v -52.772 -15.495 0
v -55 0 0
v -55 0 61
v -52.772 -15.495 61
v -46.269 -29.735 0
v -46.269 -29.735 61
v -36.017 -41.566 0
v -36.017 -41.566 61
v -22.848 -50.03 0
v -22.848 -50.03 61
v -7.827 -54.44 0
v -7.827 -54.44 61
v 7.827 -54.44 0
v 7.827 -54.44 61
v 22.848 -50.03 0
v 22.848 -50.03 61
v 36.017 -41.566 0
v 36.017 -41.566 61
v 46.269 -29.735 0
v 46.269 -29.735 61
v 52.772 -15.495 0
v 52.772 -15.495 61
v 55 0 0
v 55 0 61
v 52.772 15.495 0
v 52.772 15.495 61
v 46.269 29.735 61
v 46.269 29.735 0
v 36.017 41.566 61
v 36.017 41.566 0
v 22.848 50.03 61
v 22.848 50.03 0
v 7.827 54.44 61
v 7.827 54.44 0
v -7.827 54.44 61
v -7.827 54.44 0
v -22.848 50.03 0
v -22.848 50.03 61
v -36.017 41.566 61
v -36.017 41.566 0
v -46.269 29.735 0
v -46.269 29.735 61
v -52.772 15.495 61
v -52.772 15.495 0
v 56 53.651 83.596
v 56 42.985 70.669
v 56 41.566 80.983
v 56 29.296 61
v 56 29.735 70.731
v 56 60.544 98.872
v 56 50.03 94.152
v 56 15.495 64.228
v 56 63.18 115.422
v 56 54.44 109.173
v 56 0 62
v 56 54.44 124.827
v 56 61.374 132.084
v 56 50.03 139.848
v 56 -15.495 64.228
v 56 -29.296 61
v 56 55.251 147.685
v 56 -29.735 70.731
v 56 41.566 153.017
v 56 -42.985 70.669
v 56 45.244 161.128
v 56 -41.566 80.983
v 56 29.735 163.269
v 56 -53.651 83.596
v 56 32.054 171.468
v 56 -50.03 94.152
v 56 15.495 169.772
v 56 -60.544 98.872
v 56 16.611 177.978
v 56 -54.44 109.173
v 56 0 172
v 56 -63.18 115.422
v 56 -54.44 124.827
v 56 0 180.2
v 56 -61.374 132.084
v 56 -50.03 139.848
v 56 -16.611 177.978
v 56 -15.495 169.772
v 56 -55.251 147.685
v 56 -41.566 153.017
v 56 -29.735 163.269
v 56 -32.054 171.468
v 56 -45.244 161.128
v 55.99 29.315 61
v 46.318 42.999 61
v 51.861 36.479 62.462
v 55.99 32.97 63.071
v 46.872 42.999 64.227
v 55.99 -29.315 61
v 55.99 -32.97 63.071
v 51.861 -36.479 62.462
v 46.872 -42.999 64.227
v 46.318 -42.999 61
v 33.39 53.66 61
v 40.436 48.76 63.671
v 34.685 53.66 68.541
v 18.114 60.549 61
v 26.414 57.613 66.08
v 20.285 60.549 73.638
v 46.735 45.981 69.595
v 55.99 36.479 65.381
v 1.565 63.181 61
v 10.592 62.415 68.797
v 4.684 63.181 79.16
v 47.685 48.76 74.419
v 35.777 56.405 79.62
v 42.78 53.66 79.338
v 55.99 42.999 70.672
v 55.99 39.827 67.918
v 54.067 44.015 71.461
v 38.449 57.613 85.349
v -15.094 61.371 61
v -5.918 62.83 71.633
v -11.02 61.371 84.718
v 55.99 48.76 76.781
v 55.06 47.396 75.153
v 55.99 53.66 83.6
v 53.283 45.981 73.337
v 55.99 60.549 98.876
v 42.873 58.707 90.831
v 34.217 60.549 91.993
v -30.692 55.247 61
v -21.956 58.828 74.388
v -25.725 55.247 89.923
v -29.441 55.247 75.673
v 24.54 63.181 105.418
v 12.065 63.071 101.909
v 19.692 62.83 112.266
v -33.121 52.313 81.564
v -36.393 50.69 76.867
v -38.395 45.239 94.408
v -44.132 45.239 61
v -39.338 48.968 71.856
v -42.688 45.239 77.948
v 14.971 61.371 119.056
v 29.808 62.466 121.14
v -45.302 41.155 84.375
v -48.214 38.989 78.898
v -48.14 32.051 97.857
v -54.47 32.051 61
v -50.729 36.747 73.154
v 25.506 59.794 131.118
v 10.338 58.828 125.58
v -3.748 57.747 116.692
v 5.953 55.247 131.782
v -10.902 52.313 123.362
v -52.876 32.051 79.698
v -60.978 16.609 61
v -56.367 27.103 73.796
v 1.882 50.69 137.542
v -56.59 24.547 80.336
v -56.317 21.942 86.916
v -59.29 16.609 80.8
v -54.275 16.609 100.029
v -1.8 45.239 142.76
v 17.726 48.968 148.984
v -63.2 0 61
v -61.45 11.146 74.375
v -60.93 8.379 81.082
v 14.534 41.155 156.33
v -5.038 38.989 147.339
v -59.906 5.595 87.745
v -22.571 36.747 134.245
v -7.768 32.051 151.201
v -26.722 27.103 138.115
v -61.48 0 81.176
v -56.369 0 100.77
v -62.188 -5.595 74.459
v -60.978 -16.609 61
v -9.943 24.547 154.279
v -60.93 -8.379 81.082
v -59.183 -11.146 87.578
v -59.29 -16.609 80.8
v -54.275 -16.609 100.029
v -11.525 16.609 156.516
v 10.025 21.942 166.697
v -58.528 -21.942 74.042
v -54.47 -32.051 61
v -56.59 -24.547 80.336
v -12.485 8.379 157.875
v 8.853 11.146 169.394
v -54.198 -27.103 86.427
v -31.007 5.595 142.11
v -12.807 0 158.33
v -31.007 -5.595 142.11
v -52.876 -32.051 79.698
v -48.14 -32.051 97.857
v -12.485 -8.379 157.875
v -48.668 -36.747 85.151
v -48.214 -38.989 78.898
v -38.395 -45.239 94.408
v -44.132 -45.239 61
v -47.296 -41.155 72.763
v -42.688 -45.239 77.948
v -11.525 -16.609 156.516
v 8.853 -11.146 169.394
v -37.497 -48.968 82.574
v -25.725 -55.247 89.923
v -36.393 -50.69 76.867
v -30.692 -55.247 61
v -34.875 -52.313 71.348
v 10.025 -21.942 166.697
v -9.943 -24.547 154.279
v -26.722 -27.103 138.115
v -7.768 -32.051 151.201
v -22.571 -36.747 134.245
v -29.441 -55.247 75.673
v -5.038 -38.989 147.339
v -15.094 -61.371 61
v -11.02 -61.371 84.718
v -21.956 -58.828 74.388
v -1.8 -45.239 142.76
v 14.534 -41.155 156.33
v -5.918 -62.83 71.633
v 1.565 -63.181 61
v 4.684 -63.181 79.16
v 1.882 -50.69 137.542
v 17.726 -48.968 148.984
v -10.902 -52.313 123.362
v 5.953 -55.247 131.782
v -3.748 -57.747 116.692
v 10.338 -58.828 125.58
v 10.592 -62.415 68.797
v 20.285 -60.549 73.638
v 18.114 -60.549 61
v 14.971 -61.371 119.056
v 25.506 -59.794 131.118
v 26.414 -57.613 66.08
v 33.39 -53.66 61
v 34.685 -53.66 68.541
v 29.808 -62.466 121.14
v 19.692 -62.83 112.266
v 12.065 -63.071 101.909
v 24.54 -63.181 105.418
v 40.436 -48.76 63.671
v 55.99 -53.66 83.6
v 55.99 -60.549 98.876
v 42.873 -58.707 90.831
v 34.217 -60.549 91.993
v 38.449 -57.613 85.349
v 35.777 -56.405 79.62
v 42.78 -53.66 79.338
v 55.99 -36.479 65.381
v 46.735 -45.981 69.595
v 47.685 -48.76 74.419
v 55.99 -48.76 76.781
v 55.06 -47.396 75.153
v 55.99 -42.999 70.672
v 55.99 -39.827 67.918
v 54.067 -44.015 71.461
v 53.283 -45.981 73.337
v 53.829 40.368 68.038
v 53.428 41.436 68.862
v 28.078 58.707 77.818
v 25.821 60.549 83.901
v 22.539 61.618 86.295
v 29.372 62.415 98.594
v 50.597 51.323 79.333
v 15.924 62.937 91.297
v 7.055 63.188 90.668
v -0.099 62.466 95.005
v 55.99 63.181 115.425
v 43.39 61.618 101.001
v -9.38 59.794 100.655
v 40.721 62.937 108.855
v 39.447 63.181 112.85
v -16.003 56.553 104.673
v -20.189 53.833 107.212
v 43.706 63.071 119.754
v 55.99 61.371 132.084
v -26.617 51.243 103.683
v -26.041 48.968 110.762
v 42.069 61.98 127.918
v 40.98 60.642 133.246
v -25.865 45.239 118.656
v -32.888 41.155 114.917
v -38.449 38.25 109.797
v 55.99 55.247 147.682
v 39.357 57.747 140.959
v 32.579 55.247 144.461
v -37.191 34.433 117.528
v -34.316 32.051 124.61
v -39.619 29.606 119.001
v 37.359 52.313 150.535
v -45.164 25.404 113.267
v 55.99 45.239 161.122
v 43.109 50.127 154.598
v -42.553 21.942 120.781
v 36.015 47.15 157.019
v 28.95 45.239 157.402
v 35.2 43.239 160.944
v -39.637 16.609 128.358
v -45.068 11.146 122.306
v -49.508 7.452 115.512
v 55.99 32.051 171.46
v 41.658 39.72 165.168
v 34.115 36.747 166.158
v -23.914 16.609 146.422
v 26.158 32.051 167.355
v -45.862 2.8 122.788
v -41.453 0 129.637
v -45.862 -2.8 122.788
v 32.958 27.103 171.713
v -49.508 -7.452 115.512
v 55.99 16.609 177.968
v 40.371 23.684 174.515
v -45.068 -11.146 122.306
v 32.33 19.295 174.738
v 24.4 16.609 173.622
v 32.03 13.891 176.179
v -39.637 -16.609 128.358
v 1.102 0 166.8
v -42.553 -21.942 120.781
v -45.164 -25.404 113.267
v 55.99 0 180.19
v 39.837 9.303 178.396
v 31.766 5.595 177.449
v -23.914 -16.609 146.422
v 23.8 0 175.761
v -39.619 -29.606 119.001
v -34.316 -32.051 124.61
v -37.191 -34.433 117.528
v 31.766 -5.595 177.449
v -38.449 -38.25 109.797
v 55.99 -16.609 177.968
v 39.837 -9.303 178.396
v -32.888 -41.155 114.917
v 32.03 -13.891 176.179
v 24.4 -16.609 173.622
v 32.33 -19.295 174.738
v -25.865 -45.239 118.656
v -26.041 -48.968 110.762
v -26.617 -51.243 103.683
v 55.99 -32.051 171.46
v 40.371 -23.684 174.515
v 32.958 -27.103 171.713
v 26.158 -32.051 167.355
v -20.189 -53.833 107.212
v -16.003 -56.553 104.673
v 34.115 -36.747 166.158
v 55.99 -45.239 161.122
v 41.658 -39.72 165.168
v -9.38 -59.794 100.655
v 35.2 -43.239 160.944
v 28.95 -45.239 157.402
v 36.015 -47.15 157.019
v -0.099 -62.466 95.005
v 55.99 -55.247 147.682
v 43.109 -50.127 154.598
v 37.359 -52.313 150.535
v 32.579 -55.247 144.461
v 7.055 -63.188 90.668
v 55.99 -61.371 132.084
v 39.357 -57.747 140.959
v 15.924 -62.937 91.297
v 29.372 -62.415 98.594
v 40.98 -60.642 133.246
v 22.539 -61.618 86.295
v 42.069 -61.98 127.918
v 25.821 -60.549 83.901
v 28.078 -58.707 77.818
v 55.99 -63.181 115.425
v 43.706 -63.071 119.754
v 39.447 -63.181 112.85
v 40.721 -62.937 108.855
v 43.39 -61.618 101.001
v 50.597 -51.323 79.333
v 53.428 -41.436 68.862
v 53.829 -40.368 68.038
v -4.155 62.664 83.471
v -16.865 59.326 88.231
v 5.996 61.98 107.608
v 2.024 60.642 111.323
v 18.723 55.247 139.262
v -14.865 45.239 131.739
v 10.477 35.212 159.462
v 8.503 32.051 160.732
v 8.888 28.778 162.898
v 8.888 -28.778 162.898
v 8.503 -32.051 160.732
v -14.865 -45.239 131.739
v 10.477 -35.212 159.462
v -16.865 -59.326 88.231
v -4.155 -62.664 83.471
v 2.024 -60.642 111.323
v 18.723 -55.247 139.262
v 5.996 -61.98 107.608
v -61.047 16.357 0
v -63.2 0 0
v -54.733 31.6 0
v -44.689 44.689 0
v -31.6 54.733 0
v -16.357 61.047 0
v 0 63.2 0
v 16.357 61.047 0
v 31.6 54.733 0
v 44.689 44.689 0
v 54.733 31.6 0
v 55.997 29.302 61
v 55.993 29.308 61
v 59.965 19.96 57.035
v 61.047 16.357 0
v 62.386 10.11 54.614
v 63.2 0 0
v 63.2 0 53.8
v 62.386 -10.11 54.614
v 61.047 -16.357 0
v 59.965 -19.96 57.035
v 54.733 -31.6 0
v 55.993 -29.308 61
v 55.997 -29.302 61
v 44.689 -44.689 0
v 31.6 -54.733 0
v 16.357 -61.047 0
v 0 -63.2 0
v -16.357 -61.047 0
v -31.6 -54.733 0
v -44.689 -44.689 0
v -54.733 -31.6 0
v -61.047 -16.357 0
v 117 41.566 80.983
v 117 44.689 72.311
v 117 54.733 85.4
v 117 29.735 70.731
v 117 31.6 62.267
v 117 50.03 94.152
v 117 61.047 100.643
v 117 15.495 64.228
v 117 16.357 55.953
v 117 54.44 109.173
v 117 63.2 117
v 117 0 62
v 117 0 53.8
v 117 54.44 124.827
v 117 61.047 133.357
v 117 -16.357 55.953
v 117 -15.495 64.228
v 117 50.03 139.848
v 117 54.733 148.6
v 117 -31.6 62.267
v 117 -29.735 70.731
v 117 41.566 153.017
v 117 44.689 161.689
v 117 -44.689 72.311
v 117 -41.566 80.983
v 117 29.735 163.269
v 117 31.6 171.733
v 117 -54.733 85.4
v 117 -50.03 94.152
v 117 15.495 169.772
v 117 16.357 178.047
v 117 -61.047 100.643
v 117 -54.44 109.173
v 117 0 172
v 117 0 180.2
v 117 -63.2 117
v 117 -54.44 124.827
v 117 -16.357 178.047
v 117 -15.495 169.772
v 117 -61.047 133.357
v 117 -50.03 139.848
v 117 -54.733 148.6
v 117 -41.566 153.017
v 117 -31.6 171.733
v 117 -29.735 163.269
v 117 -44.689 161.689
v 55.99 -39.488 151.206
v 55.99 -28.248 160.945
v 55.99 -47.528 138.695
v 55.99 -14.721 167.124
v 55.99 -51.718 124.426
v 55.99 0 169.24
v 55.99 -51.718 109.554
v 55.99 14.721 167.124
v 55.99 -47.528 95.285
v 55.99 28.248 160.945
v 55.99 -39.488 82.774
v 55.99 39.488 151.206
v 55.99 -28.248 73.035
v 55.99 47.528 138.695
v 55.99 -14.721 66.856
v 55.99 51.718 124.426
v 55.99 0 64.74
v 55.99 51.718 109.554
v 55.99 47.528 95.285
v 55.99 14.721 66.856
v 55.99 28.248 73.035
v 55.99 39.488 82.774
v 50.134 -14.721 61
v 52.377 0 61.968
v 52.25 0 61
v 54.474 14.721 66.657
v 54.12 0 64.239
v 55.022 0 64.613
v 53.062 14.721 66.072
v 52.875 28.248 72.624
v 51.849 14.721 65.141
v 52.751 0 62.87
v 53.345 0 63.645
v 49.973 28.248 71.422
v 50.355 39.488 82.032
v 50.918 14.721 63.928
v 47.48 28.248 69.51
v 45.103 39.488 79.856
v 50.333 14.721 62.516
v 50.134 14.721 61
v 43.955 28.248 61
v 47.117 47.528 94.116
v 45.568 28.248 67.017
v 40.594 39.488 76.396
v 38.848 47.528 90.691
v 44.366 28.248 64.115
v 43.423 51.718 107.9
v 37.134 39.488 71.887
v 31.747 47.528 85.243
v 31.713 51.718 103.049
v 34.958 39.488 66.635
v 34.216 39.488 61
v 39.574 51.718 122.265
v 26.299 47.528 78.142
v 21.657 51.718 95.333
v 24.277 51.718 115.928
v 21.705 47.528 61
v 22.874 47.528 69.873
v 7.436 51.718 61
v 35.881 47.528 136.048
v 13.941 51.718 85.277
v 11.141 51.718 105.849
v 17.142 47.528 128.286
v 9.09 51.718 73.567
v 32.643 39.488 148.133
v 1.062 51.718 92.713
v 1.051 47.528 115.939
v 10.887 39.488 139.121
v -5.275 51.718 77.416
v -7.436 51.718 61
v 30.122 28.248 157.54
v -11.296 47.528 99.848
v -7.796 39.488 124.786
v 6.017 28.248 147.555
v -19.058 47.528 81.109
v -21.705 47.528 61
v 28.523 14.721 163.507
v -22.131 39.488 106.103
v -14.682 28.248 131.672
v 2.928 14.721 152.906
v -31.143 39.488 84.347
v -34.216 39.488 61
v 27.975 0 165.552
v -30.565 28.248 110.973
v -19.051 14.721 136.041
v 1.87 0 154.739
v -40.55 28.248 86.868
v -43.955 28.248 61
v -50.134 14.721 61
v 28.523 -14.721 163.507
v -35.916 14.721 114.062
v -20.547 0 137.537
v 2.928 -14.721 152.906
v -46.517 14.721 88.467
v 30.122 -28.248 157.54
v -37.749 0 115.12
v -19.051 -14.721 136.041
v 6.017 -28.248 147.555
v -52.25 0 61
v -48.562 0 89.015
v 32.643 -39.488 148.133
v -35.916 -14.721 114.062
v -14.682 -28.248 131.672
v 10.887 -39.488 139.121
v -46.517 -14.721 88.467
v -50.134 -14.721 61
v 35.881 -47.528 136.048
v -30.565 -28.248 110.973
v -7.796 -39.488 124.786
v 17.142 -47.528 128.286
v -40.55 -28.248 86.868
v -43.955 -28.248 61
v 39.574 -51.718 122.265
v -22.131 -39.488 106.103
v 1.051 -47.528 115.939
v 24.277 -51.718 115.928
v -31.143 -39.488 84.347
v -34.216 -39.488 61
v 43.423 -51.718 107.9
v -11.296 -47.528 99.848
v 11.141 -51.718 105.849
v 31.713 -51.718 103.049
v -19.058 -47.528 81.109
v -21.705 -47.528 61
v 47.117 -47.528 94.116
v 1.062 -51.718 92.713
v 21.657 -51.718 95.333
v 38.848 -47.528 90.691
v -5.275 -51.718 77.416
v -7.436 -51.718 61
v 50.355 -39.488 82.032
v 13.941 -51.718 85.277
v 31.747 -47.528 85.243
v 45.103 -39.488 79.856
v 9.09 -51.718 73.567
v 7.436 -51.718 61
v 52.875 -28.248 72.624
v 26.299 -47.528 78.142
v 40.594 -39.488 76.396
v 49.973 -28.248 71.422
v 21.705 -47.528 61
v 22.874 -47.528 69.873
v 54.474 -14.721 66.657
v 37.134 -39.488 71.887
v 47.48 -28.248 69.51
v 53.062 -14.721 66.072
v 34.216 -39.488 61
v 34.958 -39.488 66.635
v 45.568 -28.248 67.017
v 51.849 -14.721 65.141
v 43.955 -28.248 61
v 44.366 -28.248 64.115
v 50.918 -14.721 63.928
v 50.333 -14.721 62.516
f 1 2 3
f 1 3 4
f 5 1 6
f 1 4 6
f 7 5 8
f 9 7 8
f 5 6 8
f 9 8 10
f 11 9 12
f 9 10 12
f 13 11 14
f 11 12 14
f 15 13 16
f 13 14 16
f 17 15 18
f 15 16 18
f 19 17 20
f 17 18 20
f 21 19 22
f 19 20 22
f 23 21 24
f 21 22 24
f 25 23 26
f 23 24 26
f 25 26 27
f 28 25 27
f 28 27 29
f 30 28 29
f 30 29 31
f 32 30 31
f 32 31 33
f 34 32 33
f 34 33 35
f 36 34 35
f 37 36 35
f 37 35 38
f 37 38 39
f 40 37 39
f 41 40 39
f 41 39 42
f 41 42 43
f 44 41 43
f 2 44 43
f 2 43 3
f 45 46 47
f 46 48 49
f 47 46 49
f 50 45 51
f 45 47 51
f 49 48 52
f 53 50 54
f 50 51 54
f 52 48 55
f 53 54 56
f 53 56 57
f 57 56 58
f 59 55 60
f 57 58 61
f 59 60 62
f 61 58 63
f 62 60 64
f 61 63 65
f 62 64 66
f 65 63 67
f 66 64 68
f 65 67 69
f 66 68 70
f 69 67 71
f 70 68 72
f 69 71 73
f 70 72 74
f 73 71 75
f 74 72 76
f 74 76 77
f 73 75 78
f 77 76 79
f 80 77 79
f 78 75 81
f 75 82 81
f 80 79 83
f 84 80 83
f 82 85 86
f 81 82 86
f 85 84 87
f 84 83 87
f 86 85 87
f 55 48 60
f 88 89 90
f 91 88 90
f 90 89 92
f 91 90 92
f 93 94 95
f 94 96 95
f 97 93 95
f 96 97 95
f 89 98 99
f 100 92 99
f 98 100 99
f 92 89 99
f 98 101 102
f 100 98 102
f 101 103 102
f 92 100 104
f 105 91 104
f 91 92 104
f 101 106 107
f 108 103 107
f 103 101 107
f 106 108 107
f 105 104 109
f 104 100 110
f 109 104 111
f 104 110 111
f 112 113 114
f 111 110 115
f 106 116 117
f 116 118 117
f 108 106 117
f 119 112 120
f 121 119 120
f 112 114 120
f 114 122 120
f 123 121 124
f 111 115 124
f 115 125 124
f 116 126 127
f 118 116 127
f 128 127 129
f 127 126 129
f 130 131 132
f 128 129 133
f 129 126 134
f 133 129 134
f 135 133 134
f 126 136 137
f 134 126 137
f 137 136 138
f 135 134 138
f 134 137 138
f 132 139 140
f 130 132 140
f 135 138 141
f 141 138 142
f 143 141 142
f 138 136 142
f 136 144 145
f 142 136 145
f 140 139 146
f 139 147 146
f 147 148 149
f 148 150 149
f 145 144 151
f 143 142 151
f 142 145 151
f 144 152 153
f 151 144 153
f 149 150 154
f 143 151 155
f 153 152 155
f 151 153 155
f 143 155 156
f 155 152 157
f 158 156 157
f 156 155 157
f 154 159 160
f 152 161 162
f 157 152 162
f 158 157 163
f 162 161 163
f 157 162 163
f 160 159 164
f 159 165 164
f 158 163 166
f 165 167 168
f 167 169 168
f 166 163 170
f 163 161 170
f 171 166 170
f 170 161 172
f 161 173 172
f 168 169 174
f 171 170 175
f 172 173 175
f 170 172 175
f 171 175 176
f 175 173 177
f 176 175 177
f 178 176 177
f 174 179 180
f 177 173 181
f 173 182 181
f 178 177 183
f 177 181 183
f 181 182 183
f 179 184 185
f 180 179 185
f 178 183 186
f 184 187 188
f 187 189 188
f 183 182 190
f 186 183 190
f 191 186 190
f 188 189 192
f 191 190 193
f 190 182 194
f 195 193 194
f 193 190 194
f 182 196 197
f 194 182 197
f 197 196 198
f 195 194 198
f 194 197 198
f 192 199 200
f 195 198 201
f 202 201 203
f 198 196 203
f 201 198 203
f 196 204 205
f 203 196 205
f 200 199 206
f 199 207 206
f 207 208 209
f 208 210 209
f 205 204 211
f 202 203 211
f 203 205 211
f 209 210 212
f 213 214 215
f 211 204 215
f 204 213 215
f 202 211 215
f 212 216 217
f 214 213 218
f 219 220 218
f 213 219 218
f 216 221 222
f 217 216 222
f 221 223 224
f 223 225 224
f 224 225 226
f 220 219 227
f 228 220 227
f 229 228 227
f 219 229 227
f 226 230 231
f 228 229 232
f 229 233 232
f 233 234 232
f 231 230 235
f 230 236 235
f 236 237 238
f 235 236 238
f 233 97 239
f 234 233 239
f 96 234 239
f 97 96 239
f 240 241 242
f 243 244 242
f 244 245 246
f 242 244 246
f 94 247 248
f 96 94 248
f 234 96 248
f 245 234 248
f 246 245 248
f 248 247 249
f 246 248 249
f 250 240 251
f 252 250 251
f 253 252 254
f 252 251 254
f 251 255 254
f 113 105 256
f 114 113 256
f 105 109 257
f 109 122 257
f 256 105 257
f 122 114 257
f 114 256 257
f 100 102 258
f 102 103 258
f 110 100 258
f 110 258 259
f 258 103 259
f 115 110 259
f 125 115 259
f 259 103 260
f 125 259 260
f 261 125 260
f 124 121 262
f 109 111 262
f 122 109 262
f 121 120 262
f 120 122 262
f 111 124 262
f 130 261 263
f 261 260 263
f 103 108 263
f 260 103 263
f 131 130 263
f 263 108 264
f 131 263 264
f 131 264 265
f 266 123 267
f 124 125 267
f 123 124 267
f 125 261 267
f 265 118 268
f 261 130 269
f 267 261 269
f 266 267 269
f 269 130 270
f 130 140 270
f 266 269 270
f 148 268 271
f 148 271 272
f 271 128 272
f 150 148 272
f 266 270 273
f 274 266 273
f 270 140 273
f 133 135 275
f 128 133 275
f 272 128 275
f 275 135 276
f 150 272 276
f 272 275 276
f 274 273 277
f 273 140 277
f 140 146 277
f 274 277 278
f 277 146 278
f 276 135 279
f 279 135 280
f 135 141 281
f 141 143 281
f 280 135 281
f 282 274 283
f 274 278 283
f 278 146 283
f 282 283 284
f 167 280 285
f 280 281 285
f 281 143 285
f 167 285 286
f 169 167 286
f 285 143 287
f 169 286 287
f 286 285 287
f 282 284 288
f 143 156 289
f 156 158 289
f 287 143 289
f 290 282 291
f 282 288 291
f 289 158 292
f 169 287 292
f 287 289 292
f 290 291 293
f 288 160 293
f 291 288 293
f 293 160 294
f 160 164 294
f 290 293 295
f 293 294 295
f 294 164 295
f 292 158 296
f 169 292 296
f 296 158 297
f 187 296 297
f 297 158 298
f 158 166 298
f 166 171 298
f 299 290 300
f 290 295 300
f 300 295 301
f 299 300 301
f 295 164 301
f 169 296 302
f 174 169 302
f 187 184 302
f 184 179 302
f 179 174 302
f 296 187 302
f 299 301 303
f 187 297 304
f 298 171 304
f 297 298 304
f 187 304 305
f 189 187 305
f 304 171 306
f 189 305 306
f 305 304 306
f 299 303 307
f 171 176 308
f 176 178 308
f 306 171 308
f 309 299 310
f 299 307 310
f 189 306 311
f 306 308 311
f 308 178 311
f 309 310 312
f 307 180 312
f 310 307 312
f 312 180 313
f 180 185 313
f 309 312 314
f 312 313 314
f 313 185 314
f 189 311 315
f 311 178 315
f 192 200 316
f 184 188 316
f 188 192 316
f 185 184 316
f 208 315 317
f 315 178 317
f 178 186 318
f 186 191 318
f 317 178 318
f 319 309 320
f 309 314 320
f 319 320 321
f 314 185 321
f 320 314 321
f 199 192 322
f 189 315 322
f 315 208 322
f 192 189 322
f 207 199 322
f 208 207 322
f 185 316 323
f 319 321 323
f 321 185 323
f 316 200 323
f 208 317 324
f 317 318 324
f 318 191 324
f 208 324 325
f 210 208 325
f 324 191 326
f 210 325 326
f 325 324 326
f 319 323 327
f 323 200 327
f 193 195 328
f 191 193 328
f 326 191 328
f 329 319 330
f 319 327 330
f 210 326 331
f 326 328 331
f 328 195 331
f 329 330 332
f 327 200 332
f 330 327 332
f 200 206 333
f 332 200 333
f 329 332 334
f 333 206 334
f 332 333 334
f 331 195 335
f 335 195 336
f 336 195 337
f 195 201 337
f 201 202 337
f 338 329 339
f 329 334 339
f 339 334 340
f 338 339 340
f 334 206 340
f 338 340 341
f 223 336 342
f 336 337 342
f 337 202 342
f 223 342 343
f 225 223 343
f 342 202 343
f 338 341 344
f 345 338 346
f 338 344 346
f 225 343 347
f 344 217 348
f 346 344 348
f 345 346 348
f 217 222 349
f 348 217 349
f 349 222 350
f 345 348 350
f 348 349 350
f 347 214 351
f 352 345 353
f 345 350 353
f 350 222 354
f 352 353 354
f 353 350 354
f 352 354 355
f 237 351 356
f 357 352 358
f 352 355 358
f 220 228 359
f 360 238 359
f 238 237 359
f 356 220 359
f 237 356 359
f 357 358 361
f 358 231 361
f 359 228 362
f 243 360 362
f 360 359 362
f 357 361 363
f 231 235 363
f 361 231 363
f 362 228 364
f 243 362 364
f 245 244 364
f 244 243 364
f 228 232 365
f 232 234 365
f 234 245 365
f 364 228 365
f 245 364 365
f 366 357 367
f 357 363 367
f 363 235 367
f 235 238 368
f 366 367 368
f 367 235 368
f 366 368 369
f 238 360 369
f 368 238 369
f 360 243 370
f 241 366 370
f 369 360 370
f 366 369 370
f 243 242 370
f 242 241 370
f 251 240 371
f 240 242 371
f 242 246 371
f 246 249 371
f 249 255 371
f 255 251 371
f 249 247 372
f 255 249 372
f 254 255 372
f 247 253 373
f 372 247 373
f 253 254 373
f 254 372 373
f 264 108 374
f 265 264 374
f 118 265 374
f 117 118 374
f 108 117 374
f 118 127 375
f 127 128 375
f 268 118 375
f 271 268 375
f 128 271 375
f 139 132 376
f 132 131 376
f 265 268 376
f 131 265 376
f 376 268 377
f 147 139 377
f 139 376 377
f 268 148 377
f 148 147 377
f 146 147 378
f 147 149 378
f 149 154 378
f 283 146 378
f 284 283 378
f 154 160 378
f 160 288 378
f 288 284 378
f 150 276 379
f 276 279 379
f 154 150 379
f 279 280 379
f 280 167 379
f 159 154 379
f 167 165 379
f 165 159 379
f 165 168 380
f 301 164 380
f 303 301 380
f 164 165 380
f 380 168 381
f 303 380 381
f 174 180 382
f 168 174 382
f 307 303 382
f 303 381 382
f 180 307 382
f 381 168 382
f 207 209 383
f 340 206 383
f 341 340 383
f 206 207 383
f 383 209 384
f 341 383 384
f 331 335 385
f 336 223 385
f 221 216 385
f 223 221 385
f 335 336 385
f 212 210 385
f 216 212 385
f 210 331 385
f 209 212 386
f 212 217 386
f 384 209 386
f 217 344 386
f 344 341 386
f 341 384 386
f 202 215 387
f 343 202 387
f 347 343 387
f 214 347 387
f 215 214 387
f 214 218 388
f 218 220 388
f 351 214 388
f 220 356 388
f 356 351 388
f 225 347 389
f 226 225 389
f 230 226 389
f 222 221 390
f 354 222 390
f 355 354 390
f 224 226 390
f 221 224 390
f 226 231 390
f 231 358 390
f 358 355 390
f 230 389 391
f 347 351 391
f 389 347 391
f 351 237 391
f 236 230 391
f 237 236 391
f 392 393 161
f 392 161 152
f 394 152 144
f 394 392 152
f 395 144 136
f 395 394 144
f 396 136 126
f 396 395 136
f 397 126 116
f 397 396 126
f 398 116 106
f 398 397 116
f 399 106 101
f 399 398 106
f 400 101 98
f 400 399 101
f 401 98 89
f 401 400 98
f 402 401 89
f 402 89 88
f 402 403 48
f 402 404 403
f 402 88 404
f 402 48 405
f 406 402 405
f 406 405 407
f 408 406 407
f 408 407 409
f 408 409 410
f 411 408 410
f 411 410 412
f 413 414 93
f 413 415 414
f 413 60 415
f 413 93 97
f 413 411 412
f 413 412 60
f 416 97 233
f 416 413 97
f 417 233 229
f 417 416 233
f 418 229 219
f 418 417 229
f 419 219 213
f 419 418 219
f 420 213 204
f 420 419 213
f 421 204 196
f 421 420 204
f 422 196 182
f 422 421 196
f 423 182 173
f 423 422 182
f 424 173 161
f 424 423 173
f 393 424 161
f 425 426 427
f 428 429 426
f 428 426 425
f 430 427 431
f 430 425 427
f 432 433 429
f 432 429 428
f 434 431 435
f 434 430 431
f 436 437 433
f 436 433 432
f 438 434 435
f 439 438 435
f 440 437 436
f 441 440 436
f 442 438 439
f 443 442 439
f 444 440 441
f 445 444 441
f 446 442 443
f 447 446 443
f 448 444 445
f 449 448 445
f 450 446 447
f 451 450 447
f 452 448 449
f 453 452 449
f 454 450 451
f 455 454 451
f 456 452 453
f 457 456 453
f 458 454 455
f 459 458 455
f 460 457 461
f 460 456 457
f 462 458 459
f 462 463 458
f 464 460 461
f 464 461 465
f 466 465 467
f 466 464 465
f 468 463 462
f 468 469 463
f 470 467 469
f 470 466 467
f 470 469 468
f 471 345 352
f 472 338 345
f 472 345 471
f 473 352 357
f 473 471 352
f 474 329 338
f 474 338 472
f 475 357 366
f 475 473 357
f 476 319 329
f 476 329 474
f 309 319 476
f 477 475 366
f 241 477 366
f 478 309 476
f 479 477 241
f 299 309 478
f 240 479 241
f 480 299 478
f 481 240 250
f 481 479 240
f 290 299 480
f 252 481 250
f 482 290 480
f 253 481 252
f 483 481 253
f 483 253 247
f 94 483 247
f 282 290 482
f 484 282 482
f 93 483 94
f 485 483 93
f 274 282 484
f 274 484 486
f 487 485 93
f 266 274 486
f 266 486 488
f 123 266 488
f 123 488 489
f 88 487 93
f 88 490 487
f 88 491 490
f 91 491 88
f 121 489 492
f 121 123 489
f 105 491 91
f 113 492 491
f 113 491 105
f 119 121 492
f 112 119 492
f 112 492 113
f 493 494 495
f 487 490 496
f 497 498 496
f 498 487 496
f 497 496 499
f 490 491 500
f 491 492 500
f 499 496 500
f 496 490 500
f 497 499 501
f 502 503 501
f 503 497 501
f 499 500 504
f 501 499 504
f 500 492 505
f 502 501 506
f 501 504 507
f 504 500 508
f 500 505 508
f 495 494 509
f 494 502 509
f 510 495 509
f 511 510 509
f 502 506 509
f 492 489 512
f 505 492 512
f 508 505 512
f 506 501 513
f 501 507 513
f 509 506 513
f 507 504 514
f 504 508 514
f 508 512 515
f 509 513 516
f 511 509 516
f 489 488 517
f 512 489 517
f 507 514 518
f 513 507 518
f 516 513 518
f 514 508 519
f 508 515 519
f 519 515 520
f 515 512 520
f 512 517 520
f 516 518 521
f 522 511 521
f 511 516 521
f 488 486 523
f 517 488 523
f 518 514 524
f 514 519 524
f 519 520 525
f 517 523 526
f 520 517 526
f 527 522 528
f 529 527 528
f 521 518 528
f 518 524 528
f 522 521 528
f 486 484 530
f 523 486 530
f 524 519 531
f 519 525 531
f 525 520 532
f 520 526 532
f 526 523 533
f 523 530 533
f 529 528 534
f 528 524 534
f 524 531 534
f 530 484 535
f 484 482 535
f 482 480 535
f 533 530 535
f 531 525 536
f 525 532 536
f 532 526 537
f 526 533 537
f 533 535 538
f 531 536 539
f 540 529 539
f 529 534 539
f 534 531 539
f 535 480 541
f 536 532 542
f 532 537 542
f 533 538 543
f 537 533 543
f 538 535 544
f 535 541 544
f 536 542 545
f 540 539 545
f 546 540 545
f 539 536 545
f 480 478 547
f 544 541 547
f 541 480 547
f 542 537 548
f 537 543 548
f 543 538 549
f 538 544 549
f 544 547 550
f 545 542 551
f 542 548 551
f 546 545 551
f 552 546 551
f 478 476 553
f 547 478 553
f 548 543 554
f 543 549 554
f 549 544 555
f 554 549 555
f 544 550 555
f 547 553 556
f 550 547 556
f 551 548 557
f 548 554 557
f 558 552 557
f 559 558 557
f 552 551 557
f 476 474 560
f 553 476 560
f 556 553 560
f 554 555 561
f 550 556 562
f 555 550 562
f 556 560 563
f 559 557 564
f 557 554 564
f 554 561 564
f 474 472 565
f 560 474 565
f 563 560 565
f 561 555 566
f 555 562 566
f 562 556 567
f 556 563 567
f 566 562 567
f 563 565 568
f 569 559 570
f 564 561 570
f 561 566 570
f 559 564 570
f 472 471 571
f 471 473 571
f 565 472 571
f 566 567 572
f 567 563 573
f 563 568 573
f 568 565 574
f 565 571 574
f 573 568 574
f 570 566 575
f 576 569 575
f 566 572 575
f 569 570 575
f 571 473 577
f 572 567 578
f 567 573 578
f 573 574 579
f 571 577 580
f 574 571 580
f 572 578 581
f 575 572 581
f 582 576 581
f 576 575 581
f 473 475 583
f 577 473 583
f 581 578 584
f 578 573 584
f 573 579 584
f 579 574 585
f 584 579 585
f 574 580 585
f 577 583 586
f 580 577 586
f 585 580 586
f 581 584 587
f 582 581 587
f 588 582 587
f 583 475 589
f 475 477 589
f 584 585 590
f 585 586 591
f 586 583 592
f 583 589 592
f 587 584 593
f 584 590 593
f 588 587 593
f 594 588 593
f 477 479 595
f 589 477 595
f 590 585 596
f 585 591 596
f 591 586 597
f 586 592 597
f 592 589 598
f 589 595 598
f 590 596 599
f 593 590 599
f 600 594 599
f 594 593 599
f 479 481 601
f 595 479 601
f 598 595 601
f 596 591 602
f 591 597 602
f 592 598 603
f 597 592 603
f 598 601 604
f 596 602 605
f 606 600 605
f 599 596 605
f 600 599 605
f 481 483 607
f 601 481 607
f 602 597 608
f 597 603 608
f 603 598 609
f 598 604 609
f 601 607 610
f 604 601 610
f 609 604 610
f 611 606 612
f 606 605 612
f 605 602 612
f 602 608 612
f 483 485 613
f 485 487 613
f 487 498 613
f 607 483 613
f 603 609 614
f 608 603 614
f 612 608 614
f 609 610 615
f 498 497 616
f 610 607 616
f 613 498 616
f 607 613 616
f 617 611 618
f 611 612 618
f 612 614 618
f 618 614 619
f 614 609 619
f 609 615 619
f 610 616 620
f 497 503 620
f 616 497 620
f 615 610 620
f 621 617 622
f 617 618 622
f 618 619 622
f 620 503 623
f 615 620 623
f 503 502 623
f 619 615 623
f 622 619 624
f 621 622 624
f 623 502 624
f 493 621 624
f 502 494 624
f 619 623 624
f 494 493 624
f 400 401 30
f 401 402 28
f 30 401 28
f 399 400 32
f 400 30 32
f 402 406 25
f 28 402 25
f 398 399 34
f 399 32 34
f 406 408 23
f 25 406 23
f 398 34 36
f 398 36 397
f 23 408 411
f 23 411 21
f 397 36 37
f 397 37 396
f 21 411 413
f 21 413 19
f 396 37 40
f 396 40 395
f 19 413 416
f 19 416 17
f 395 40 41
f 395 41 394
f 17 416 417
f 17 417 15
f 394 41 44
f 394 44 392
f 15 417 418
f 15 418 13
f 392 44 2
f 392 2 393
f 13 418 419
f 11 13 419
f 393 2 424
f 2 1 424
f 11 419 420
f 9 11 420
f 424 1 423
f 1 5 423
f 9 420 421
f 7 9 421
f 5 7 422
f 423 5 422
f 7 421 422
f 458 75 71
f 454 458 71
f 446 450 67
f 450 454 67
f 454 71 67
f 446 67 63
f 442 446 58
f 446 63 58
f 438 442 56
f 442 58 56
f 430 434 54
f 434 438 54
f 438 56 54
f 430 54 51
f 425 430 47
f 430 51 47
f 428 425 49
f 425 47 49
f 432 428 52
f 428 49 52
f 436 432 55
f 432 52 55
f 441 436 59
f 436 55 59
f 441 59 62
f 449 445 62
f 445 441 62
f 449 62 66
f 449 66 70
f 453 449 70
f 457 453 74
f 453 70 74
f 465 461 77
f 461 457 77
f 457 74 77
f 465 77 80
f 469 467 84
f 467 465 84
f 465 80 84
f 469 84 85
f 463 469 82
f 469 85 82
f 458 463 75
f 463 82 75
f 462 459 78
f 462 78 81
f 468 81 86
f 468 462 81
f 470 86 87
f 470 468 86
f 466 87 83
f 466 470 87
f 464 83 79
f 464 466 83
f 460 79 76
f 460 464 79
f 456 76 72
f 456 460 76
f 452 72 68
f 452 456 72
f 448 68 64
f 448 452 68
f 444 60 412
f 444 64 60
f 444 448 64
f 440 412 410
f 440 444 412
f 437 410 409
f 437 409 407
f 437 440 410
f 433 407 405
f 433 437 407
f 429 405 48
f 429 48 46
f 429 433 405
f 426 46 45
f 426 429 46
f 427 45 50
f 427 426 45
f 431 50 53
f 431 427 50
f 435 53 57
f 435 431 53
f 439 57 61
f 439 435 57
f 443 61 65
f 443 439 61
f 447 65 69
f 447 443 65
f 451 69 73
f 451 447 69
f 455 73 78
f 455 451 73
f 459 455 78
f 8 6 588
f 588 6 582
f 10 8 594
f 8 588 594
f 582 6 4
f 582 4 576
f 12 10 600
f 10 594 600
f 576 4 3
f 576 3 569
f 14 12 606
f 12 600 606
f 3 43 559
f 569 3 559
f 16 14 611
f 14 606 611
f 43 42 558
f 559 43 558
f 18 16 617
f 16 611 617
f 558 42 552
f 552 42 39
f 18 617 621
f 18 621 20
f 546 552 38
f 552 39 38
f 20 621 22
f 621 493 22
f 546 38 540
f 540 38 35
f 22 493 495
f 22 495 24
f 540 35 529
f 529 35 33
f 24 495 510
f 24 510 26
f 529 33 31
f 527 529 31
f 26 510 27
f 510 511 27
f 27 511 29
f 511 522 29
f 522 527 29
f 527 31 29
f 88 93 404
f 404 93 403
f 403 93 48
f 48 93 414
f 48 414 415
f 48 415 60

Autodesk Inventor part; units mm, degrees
ref_plane "YZ Plane" through (0, 0, 0) normal (1, 0, 0) x (0, 1, 0)
ref_plane "XZ Plane" through (0, 0, 0) normal (0, 1, 0) x (-1, 0, 0)
ref_plane "XY Plane" through (0, 0, 0) normal (0, 0, 1) x (1, 0, 0)
sketch "Sketch1" plane through (0, 0, 0) normal (0, 1, 0) x (-1, 0, 0)
  line L0 (0, 0) -> (0, 117) construction
  line L1 (0, 117) -> (-117, 117) construction
  line L2 (63.2, 0) -> (55, 0)
  line L3 (55, 0) -> (55, 61)
  line L4 (55, 61) -> (63.2, 61)
  line L5 (63.2, 61) -> (63.2, 0)
  line L6 (0, 0) -> (55, 0) construction
  line L7 (55, 61) -> (0, 61) construction
  line L8 (-117, 117) -> (-117, 172) construction
  line L9 (-117, 172) -> (-56, 172)
  line L10 (-56, 172) -> (-56, 180.2)
  line L11 (-56, 180.2) -> (-117, 180.2)
  line L12 (-117, 180.2) -> (-117, 172)
  line L13 (-56, 172) -> (-56, 117) construction
  dimension "d0" = 61
  dimension "d1" = 56
  dimension "d2" = 110
  dimension "d3" = 8.2
  dimension "d4" = 61
  dimension "d5" = 8.2
  dimension "d6" = 110
  dimension "d7" = 56
revolve "Revolution1" add sketch "Sketch1" angle 360 about axis through (0, 0, 117) along (1, 0, 0) contours L12 L11 L10 L9
revolve "Revolution2" add sketch "Sketch1" angle 360 about axis through (0, 0, 0) along (0, 0, 1) contours L2 L3 L4 L5
sketch "Sketch2" plane through (0, 0, 61) normal (0, 0, 1) x (1, 0, 0)
  line L0 (56, 29.295733) -> (56, -29.295733)
  line L1 (56, -29.295733) -> (56, 29.295733)
  line L2 (56, 55) -> (56, -55)
  line L3 (55.99, -29.314841) -> (55.99, 29.314841)
  arc A0 (56, 29.295733) -> (56, -29.295733) centre (0, 0) ccw
  circle A1 centre (0, 0) radius 63.2
  circle A2 centre (0, 0) radius 52.25
  dimension "d8" = 0.01
  dimension "d9" = 126.4
  dimension "d10" = 104.5
revolve "Revolution3" add sketch "Sketch2" angle 90 about axis through (55.99, -29.314841, 61) along (0, 1, 0) contours L3 A0
equation "\"d0\" = t1"
equation "\"d1\" = z1"
equation "\"d2\" = dd1"
equation "\"d3\" = s1"
equation "\"d4\" = t1"
equation "\"d5\" = s1"
equation "\"d6\" = dd1"
equation "\"d7\" = z1"
equation "\"d9\" = dd1 + 2 * s1"
equation "\"d10\" = 0.95 * dd1"
equation "\"z1\" = 56"
equation "\"t1\" = 61"
equation "\"s1\" = 8.2"
equation "\"dd1\" = 110"
properties part number "DIN 8063 Колено 90 градусов, тип W1 110" material "ПВХ, непластифицированный"
